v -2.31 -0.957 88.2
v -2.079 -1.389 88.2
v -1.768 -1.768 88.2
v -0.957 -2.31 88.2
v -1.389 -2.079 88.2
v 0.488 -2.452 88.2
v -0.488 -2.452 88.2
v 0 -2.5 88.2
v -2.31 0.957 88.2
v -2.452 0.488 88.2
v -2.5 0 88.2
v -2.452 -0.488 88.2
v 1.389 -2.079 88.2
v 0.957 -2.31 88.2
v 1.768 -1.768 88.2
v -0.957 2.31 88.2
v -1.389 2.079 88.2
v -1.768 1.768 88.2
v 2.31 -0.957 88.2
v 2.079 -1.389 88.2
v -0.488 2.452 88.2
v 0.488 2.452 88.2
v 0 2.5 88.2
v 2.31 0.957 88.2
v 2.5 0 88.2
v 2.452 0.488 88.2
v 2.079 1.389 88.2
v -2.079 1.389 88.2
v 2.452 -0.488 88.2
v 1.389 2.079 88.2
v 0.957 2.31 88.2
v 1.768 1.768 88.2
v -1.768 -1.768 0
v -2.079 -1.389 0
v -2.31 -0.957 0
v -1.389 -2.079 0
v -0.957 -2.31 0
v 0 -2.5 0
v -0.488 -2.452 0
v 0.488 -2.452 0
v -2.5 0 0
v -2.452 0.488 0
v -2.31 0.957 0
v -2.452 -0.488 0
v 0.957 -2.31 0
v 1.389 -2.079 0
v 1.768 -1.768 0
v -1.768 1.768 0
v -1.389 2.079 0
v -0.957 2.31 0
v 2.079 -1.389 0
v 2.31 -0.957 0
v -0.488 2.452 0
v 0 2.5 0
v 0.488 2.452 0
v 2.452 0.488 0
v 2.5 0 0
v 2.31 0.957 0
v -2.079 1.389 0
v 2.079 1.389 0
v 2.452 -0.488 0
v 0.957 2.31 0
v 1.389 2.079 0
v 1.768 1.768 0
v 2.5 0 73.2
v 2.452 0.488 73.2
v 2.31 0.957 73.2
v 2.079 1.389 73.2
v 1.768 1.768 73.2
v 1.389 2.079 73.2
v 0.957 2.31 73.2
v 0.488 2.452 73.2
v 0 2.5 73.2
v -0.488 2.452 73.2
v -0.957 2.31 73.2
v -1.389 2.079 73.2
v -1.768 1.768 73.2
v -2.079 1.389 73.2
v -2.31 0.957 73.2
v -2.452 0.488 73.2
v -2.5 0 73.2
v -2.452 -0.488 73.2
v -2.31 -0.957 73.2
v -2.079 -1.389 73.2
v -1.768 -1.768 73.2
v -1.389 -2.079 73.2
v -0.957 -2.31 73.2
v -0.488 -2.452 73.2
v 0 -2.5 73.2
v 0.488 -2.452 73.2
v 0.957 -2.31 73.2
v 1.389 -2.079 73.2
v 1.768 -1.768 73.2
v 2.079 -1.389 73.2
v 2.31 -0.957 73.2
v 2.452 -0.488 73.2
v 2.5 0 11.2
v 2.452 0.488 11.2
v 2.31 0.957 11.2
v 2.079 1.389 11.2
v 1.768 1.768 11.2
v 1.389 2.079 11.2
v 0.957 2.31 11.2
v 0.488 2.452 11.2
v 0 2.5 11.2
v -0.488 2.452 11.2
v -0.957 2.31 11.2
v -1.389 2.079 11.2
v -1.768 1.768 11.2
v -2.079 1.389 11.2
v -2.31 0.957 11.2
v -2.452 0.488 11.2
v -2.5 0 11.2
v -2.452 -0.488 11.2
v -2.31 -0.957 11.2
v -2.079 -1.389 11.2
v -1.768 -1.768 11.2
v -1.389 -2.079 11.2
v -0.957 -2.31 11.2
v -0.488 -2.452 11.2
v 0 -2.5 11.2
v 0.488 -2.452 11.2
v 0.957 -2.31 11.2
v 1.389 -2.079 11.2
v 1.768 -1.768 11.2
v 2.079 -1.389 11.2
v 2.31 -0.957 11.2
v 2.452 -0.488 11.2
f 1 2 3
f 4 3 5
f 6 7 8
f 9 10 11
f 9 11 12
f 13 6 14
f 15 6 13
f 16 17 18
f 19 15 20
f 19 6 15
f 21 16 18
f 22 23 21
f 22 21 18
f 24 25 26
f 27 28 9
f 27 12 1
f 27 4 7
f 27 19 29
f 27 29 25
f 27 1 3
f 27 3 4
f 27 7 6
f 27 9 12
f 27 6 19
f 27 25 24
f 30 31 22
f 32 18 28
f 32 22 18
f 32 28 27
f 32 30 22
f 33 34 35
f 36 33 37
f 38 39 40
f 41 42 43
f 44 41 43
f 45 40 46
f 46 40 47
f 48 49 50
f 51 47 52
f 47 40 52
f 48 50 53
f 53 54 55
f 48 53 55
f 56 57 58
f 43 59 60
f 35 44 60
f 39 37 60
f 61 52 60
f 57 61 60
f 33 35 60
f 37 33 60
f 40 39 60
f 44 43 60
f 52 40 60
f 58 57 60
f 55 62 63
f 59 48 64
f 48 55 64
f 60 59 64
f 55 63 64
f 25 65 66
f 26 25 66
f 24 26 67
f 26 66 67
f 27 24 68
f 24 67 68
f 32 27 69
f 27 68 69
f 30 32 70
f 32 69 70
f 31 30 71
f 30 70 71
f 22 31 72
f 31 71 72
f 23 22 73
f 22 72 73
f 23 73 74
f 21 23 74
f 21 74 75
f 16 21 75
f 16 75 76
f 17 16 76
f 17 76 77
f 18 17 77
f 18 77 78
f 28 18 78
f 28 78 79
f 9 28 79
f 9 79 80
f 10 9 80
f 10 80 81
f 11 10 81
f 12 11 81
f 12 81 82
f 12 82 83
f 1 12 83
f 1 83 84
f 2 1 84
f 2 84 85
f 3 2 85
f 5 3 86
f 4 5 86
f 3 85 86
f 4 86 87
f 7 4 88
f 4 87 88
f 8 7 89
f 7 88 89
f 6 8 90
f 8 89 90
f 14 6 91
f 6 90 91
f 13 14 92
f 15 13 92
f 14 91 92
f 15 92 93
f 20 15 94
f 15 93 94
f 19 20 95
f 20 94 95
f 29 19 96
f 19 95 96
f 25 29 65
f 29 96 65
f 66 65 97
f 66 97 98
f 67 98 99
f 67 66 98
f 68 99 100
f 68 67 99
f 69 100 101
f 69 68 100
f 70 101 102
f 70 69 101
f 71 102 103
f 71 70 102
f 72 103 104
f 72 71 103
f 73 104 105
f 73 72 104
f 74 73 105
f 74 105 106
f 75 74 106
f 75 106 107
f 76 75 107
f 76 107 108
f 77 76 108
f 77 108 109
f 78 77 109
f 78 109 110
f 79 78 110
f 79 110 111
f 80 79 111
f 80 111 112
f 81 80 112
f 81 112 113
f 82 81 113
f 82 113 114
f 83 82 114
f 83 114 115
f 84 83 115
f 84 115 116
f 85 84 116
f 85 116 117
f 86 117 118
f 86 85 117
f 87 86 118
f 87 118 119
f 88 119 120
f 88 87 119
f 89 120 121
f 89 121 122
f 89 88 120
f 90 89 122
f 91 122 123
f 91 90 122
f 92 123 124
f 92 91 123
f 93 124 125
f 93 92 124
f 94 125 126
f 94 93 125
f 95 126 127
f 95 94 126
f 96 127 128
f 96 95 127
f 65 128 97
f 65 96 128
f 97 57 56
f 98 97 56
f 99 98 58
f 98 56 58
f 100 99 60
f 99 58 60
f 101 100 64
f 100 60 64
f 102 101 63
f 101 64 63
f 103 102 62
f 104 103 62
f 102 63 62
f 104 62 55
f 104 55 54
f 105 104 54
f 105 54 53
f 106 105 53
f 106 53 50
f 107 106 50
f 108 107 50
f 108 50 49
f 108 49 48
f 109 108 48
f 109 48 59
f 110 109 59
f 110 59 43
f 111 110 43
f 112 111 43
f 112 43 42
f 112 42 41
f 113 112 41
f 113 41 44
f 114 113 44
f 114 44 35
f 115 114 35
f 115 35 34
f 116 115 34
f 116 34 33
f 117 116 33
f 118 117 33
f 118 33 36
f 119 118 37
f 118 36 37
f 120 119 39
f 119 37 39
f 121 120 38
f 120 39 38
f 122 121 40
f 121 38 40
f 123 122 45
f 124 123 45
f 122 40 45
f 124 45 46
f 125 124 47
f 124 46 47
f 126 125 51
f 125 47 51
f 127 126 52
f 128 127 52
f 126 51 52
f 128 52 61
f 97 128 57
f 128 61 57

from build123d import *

# Parameters (mm, degrees)
SKETCH_1_R             = 2.5
EXTRUDE_1_DEPTH        = 88.2
SKETCH_2_R             = 12.5
EXTRUDE_2_DEPTH        = 62
SKETCH_3_W             = 40
SKETCH_3_H             = 17.730441408
SKETCH_3_R             = 5
EXTRUDE_3_DEPTH        = 3
PATTERN_LINEAR_1_COUNT = 2
PATTERN_LINEAR_1_PITCH = 59
SKETCH_5_R             = 2.5
CUT_EXTRUDE_1_DEPTH    = 98.649833589


with BuildPart() as part:
    # 草图1 → 凸台-拉伸1 (new body)
    with BuildSketch(Plane.XY):
        Circle(SKETCH_1_R)
    extrude(amount=EXTRUDE_1_DEPTH)

    # 草图2 → 凸台-拉伸2 (add)
    with BuildSketch(Plane.XY.offset(73.2)):
        Circle(SKETCH_2_R)
    extrude(amount=-EXTRUDE_2_DEPTH)

    # 草图3 → 凸台-拉伸3 (add)
    with BuildSketch(Plane.XY.offset(73.2)):
        with Locations((20, 0)):
            Rectangle(SKETCH_3_W, SKETCH_3_H)
        with Locations((32.640039451, 0)):
            Circle(SKETCH_3_R, mode=Mode.SUBTRACT)
    extrude_3 = extrude(amount=-EXTRUDE_3_DEPTH)

    # 阵列(线性)1: 凸台-拉伸3 ×2
    with Locations(*[(0, 0, -i * PATTERN_LINEAR_1_PITCH) for i in range(1, PATTERN_LINEAR_1_COUNT)]):
        add(extrude_3)

    # 草图5 → 切除-拉伸1 (cut, through all)
    with BuildSketch(Plane.XY.offset(88.2)):
        with BuildLine():
            Line((8.812369821, 8.865220704), (40, 8.865220704))
            Line((40, 8.865220704), (40, -8.865220704))
            Line((40, -8.865220704), (8.812369821, -8.865220704))
            ThreePointArc((8.812369821, -8.865220704), (-12.5, 0), (8.812369821, 8.865220704))
        make_face()
        Circle(SKETCH_5_R, mode=Mode.SUBTRACT)
    extrude(amount=-CUT_EXTRUDE_1_DEPTH, mode=Mode.SUBTRACT)


solid = part.part
